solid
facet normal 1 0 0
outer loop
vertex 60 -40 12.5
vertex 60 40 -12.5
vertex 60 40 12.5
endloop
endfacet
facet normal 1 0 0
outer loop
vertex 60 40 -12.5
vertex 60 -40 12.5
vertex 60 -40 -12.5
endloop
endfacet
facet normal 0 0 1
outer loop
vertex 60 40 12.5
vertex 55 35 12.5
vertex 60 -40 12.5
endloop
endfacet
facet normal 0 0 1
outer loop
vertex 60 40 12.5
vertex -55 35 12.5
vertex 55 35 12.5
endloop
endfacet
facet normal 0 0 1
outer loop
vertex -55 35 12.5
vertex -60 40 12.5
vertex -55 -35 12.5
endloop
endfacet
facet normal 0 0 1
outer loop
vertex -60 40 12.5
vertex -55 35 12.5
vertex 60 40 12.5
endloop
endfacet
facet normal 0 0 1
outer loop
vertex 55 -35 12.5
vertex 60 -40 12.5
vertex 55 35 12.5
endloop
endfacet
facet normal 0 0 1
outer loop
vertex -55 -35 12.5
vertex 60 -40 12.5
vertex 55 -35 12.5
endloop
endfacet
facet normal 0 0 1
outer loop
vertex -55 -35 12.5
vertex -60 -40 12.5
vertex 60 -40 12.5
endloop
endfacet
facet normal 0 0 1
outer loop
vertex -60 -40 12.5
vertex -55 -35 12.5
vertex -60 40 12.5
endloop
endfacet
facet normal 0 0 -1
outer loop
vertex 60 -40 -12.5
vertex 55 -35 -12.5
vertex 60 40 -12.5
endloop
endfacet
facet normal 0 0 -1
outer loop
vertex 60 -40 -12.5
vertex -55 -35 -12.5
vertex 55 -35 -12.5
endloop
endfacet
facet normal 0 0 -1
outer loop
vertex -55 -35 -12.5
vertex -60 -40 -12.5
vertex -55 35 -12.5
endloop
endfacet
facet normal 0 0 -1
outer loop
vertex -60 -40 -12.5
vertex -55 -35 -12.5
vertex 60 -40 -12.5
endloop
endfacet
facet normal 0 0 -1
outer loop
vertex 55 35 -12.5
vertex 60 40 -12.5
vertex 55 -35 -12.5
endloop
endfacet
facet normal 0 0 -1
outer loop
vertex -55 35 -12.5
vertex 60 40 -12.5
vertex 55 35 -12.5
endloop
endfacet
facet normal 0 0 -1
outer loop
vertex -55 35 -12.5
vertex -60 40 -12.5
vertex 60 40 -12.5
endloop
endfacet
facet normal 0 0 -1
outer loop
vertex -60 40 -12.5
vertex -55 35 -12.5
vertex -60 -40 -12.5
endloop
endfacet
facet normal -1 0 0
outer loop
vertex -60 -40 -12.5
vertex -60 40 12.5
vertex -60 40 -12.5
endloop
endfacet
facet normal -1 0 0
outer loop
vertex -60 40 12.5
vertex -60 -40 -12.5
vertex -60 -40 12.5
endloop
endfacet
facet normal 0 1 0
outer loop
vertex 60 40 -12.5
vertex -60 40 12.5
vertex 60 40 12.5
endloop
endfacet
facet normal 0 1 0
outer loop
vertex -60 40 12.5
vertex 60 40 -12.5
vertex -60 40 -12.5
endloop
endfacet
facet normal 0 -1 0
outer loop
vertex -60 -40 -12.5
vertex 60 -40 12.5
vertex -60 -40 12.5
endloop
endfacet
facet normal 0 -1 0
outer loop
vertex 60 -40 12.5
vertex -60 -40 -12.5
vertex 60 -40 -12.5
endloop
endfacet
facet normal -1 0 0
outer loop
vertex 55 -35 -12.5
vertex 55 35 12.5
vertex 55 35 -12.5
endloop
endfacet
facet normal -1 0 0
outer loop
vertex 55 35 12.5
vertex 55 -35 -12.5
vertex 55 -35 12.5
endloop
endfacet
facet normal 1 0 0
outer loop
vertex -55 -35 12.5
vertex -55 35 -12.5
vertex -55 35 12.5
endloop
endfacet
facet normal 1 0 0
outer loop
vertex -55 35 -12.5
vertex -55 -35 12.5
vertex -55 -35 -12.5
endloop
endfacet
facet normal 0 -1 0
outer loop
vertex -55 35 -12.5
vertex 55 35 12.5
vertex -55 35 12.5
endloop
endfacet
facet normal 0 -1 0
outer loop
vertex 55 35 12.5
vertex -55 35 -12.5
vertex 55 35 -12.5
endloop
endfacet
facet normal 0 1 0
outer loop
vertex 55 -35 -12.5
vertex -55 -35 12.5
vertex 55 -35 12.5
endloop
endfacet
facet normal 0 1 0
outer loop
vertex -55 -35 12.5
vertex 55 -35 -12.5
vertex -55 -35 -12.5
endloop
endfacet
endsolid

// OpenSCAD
difference(){cube([120,80,25],center=true); translate([0,0,2]) cube([110,70,30],center=true);}
